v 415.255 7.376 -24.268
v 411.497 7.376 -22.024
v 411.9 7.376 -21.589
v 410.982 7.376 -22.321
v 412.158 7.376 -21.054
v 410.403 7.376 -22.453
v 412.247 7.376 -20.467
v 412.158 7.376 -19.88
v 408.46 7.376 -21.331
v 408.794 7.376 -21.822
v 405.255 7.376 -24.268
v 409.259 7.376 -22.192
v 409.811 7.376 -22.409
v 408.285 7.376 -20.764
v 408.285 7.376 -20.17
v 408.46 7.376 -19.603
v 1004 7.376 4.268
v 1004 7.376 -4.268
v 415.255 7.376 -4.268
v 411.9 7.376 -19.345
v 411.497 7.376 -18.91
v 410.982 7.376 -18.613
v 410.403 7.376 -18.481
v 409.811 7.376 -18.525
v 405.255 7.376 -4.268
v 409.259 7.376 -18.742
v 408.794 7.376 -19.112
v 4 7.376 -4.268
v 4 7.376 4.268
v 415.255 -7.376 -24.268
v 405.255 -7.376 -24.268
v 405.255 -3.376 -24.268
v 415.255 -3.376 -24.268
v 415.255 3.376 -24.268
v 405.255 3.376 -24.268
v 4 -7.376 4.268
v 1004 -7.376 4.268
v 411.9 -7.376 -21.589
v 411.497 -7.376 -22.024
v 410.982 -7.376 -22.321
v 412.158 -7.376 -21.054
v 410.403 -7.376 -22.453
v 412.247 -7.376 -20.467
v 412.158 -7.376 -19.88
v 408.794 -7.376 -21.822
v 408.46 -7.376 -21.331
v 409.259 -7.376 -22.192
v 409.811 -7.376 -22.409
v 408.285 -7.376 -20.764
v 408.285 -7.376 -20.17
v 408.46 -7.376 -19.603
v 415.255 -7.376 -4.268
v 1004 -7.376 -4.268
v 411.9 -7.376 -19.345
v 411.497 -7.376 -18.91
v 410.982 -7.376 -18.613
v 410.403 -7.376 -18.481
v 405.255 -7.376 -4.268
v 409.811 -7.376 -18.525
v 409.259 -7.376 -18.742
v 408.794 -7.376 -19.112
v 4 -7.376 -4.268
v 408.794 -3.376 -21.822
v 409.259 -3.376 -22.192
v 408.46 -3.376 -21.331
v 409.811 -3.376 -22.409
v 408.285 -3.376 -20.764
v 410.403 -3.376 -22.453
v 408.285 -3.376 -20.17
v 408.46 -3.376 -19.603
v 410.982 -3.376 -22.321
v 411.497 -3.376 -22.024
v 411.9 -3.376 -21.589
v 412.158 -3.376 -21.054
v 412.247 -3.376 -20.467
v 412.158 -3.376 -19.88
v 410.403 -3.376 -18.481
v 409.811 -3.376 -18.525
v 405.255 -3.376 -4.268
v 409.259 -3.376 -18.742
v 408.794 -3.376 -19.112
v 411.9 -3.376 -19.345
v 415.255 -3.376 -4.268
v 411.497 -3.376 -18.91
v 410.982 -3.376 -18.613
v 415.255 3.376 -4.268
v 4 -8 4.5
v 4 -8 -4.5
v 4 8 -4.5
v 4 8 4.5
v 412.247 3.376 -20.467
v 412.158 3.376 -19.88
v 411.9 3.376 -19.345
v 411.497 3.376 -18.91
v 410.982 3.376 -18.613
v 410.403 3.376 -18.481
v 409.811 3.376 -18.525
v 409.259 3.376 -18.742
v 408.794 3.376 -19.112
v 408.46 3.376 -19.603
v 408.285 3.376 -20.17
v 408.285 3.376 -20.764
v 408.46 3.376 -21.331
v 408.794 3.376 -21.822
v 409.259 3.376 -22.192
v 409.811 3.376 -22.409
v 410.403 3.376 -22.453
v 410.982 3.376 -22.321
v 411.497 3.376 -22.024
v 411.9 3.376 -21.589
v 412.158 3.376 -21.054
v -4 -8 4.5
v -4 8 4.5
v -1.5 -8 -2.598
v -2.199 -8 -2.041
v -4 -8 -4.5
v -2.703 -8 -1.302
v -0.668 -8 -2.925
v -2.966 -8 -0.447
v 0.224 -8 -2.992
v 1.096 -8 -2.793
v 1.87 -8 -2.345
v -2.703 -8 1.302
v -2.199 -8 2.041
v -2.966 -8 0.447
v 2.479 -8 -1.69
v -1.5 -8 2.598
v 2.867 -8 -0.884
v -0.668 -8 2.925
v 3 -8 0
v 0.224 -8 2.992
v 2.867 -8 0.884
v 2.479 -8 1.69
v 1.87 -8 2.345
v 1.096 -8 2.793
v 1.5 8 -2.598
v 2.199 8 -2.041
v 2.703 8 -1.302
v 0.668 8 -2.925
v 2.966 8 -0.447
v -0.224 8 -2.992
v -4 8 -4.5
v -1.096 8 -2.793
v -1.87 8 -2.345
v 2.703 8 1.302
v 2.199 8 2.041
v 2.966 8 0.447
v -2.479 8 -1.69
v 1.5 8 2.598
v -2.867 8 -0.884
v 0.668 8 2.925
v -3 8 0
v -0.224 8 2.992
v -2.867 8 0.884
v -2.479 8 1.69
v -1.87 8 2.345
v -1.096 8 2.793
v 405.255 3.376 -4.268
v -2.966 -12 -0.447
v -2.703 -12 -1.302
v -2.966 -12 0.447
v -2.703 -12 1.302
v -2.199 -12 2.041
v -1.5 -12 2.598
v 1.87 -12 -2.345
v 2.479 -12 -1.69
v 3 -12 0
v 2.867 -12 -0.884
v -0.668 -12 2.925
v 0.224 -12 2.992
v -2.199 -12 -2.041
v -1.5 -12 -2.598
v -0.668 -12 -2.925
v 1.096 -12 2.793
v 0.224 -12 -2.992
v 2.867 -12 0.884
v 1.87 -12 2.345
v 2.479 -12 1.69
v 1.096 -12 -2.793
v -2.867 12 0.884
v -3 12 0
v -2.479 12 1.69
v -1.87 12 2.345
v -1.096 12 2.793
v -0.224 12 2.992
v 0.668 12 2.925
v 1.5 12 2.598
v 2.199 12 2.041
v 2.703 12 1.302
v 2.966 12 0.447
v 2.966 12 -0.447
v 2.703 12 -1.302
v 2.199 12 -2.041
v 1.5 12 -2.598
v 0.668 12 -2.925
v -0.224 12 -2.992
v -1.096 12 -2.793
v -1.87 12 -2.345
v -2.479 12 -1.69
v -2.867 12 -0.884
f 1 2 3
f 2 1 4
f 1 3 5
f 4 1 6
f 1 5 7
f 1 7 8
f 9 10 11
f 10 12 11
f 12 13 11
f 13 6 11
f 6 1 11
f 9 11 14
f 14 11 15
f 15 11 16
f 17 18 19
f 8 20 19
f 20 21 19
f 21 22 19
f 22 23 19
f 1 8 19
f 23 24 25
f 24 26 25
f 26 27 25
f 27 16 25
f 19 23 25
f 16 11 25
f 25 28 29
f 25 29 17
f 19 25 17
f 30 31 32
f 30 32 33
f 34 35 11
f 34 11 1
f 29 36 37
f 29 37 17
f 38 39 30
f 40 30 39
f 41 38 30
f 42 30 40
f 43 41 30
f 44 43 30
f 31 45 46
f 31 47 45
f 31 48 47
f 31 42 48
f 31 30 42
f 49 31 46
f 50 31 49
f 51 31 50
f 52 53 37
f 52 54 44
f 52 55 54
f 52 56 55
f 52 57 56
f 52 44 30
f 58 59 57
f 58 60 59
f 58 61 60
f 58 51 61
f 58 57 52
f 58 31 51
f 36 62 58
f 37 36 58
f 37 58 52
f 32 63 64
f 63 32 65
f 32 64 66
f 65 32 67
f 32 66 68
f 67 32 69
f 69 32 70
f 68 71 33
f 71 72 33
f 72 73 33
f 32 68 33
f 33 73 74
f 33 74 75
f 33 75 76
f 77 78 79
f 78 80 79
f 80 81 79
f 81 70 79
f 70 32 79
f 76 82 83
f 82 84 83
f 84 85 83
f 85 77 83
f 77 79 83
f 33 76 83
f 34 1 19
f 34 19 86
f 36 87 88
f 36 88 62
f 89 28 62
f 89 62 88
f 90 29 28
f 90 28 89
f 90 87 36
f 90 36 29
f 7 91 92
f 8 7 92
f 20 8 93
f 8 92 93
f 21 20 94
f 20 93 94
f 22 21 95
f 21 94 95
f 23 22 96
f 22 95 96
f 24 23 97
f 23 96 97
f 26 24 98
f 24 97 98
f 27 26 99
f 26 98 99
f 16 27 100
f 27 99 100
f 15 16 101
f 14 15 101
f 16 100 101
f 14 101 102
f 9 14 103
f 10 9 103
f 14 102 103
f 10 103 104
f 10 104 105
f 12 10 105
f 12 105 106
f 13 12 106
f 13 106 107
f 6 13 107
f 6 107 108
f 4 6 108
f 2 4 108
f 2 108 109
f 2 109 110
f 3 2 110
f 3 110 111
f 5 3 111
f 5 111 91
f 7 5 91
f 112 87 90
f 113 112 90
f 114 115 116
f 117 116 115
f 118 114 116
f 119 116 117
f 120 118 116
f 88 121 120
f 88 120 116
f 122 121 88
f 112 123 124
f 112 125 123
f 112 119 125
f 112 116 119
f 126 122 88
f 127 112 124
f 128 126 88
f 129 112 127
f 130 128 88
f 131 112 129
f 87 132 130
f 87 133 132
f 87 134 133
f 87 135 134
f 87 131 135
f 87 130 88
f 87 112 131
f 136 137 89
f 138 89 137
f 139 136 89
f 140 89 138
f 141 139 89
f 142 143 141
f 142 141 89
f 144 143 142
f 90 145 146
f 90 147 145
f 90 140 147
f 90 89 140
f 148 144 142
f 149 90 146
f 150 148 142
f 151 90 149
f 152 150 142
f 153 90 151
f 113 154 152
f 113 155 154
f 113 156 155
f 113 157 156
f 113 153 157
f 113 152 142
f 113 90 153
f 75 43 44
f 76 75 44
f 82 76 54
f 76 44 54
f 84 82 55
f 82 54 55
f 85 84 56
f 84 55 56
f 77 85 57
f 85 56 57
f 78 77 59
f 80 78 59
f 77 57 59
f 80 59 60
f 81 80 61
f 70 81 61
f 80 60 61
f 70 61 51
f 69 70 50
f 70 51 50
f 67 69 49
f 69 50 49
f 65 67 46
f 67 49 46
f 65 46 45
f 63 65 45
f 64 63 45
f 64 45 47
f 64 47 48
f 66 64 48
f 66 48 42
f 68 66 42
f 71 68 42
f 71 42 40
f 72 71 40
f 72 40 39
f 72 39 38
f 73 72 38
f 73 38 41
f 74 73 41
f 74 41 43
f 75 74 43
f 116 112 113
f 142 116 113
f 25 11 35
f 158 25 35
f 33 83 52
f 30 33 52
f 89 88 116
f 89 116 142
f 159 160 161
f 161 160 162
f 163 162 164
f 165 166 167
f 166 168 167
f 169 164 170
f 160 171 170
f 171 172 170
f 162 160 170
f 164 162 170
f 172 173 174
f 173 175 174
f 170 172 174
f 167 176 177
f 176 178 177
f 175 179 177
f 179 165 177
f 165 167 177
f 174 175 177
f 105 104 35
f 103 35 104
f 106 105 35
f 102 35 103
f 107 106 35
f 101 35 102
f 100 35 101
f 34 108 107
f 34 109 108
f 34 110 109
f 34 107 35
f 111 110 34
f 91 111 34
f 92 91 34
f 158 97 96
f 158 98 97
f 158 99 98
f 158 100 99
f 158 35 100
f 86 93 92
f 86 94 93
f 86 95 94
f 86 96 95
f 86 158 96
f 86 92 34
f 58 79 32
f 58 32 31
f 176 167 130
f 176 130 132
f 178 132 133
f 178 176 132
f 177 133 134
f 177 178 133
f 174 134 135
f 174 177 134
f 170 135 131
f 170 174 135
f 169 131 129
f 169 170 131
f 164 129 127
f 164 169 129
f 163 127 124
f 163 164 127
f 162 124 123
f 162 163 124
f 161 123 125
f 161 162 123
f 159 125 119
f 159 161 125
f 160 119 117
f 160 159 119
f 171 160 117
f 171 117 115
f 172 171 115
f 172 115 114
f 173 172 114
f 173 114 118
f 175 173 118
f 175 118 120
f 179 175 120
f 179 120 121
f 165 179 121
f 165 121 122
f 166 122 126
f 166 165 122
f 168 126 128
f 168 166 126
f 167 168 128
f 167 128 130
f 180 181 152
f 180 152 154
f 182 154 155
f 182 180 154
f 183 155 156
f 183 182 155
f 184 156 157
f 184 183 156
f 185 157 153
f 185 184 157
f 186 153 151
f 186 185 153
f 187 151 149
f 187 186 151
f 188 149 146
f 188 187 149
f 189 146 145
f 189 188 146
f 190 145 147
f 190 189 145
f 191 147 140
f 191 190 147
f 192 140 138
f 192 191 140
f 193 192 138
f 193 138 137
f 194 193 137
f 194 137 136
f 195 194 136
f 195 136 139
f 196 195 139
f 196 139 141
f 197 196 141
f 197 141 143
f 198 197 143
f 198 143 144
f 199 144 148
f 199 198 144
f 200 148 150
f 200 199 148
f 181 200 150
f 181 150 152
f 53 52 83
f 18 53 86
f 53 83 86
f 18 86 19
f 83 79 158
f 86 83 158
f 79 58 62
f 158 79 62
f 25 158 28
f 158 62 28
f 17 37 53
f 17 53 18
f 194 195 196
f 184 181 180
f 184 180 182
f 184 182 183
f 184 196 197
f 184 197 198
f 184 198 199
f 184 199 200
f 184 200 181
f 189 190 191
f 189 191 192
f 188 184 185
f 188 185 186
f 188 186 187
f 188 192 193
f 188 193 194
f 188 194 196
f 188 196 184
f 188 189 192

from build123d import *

# Parameters (mm, degrees)
F0_W      = 24
F0_H      = 9
F1_DEPTH  = 4
F2_W      = 8
F2_H      = 9
F2_R      = 3
F3_DEPTH  = 4
F4_W      = 8
F4_H      = 9
F4_R      = 3
F5_DEPTH  = 4
F6_W      = 14.751910232
F6_H      = 8.5369339213
F7_DEPTH  = 1000
F8_W      = 10
F8_H      = 4
F9_DEPTH  = 20
F10_DEPTH = 20
F11_R     = 1.9919096681
F12_DEPTH = 50


with BuildPart() as f1:
    # F0 (on Right) → F1 (new body, symmetric)
    with BuildSketch(Plane.YZ):
        Rectangle(F0_W, F0_H)
    extrude(amount=F1_DEPTH, both=True)

    # F2 (on face) → F3 (cut)
    with BuildSketch(Plane.XZ.offset(12)):
        Rectangle(F2_W, F2_H)
        Circle(F2_R, mode=Mode.SUBTRACT)
    extrude(amount=-F3_DEPTH, mode=Mode.SUBTRACT)

    # F4 (on face) → F5 (cut)
    with BuildSketch(Plane(origin=(0, 12, 0), x_dir=(-1, 0, 0), z_dir=(0, 1, 0))):
        Rectangle(F4_W, F4_H)
        Circle(F4_R, mode=Mode.SUBTRACT)
    extrude(amount=-F5_DEPTH, mode=Mode.SUBTRACT)

    # F6 (on face) → F7 (join)
    with BuildSketch(Plane.YZ.offset(4)):
        Rectangle(F6_W, F6_H)
    extrude(amount=F7_DEPTH)

    # F8 (on face) → F9 (join)
    with BuildSketch(Plane(origin=(0, 0, -4.2684669606), x_dir=(1, 0, 0), z_dir=(0, 0, -1))):
        with Locations((410.2546322346, 5.375955116)):
            Rectangle(F8_W, F8_H)
    extrude(amount=F9_DEPTH)

    # F8 (on face) → F10 (join)
    with BuildSketch(Plane(origin=(0, 0, -4.2684669606), x_dir=(1, 0, 0), z_dir=(0, 0, -1))):
        with Locations((410.2546322346, -5.375955116)):
            Rectangle(F8_W, F8_H)
    extrude(amount=F10_DEPTH)

    # F11 (on face) → F12 (cut)
    with BuildSketch(Plane.XZ.offset(7.375955116)):
        with Locations((410.2546322346, -20.4669394419)):
            Circle(F11_R)
    extrude(amount=-F12_DEPTH, mode=Mode.SUBTRACT)


solid = f1.part
